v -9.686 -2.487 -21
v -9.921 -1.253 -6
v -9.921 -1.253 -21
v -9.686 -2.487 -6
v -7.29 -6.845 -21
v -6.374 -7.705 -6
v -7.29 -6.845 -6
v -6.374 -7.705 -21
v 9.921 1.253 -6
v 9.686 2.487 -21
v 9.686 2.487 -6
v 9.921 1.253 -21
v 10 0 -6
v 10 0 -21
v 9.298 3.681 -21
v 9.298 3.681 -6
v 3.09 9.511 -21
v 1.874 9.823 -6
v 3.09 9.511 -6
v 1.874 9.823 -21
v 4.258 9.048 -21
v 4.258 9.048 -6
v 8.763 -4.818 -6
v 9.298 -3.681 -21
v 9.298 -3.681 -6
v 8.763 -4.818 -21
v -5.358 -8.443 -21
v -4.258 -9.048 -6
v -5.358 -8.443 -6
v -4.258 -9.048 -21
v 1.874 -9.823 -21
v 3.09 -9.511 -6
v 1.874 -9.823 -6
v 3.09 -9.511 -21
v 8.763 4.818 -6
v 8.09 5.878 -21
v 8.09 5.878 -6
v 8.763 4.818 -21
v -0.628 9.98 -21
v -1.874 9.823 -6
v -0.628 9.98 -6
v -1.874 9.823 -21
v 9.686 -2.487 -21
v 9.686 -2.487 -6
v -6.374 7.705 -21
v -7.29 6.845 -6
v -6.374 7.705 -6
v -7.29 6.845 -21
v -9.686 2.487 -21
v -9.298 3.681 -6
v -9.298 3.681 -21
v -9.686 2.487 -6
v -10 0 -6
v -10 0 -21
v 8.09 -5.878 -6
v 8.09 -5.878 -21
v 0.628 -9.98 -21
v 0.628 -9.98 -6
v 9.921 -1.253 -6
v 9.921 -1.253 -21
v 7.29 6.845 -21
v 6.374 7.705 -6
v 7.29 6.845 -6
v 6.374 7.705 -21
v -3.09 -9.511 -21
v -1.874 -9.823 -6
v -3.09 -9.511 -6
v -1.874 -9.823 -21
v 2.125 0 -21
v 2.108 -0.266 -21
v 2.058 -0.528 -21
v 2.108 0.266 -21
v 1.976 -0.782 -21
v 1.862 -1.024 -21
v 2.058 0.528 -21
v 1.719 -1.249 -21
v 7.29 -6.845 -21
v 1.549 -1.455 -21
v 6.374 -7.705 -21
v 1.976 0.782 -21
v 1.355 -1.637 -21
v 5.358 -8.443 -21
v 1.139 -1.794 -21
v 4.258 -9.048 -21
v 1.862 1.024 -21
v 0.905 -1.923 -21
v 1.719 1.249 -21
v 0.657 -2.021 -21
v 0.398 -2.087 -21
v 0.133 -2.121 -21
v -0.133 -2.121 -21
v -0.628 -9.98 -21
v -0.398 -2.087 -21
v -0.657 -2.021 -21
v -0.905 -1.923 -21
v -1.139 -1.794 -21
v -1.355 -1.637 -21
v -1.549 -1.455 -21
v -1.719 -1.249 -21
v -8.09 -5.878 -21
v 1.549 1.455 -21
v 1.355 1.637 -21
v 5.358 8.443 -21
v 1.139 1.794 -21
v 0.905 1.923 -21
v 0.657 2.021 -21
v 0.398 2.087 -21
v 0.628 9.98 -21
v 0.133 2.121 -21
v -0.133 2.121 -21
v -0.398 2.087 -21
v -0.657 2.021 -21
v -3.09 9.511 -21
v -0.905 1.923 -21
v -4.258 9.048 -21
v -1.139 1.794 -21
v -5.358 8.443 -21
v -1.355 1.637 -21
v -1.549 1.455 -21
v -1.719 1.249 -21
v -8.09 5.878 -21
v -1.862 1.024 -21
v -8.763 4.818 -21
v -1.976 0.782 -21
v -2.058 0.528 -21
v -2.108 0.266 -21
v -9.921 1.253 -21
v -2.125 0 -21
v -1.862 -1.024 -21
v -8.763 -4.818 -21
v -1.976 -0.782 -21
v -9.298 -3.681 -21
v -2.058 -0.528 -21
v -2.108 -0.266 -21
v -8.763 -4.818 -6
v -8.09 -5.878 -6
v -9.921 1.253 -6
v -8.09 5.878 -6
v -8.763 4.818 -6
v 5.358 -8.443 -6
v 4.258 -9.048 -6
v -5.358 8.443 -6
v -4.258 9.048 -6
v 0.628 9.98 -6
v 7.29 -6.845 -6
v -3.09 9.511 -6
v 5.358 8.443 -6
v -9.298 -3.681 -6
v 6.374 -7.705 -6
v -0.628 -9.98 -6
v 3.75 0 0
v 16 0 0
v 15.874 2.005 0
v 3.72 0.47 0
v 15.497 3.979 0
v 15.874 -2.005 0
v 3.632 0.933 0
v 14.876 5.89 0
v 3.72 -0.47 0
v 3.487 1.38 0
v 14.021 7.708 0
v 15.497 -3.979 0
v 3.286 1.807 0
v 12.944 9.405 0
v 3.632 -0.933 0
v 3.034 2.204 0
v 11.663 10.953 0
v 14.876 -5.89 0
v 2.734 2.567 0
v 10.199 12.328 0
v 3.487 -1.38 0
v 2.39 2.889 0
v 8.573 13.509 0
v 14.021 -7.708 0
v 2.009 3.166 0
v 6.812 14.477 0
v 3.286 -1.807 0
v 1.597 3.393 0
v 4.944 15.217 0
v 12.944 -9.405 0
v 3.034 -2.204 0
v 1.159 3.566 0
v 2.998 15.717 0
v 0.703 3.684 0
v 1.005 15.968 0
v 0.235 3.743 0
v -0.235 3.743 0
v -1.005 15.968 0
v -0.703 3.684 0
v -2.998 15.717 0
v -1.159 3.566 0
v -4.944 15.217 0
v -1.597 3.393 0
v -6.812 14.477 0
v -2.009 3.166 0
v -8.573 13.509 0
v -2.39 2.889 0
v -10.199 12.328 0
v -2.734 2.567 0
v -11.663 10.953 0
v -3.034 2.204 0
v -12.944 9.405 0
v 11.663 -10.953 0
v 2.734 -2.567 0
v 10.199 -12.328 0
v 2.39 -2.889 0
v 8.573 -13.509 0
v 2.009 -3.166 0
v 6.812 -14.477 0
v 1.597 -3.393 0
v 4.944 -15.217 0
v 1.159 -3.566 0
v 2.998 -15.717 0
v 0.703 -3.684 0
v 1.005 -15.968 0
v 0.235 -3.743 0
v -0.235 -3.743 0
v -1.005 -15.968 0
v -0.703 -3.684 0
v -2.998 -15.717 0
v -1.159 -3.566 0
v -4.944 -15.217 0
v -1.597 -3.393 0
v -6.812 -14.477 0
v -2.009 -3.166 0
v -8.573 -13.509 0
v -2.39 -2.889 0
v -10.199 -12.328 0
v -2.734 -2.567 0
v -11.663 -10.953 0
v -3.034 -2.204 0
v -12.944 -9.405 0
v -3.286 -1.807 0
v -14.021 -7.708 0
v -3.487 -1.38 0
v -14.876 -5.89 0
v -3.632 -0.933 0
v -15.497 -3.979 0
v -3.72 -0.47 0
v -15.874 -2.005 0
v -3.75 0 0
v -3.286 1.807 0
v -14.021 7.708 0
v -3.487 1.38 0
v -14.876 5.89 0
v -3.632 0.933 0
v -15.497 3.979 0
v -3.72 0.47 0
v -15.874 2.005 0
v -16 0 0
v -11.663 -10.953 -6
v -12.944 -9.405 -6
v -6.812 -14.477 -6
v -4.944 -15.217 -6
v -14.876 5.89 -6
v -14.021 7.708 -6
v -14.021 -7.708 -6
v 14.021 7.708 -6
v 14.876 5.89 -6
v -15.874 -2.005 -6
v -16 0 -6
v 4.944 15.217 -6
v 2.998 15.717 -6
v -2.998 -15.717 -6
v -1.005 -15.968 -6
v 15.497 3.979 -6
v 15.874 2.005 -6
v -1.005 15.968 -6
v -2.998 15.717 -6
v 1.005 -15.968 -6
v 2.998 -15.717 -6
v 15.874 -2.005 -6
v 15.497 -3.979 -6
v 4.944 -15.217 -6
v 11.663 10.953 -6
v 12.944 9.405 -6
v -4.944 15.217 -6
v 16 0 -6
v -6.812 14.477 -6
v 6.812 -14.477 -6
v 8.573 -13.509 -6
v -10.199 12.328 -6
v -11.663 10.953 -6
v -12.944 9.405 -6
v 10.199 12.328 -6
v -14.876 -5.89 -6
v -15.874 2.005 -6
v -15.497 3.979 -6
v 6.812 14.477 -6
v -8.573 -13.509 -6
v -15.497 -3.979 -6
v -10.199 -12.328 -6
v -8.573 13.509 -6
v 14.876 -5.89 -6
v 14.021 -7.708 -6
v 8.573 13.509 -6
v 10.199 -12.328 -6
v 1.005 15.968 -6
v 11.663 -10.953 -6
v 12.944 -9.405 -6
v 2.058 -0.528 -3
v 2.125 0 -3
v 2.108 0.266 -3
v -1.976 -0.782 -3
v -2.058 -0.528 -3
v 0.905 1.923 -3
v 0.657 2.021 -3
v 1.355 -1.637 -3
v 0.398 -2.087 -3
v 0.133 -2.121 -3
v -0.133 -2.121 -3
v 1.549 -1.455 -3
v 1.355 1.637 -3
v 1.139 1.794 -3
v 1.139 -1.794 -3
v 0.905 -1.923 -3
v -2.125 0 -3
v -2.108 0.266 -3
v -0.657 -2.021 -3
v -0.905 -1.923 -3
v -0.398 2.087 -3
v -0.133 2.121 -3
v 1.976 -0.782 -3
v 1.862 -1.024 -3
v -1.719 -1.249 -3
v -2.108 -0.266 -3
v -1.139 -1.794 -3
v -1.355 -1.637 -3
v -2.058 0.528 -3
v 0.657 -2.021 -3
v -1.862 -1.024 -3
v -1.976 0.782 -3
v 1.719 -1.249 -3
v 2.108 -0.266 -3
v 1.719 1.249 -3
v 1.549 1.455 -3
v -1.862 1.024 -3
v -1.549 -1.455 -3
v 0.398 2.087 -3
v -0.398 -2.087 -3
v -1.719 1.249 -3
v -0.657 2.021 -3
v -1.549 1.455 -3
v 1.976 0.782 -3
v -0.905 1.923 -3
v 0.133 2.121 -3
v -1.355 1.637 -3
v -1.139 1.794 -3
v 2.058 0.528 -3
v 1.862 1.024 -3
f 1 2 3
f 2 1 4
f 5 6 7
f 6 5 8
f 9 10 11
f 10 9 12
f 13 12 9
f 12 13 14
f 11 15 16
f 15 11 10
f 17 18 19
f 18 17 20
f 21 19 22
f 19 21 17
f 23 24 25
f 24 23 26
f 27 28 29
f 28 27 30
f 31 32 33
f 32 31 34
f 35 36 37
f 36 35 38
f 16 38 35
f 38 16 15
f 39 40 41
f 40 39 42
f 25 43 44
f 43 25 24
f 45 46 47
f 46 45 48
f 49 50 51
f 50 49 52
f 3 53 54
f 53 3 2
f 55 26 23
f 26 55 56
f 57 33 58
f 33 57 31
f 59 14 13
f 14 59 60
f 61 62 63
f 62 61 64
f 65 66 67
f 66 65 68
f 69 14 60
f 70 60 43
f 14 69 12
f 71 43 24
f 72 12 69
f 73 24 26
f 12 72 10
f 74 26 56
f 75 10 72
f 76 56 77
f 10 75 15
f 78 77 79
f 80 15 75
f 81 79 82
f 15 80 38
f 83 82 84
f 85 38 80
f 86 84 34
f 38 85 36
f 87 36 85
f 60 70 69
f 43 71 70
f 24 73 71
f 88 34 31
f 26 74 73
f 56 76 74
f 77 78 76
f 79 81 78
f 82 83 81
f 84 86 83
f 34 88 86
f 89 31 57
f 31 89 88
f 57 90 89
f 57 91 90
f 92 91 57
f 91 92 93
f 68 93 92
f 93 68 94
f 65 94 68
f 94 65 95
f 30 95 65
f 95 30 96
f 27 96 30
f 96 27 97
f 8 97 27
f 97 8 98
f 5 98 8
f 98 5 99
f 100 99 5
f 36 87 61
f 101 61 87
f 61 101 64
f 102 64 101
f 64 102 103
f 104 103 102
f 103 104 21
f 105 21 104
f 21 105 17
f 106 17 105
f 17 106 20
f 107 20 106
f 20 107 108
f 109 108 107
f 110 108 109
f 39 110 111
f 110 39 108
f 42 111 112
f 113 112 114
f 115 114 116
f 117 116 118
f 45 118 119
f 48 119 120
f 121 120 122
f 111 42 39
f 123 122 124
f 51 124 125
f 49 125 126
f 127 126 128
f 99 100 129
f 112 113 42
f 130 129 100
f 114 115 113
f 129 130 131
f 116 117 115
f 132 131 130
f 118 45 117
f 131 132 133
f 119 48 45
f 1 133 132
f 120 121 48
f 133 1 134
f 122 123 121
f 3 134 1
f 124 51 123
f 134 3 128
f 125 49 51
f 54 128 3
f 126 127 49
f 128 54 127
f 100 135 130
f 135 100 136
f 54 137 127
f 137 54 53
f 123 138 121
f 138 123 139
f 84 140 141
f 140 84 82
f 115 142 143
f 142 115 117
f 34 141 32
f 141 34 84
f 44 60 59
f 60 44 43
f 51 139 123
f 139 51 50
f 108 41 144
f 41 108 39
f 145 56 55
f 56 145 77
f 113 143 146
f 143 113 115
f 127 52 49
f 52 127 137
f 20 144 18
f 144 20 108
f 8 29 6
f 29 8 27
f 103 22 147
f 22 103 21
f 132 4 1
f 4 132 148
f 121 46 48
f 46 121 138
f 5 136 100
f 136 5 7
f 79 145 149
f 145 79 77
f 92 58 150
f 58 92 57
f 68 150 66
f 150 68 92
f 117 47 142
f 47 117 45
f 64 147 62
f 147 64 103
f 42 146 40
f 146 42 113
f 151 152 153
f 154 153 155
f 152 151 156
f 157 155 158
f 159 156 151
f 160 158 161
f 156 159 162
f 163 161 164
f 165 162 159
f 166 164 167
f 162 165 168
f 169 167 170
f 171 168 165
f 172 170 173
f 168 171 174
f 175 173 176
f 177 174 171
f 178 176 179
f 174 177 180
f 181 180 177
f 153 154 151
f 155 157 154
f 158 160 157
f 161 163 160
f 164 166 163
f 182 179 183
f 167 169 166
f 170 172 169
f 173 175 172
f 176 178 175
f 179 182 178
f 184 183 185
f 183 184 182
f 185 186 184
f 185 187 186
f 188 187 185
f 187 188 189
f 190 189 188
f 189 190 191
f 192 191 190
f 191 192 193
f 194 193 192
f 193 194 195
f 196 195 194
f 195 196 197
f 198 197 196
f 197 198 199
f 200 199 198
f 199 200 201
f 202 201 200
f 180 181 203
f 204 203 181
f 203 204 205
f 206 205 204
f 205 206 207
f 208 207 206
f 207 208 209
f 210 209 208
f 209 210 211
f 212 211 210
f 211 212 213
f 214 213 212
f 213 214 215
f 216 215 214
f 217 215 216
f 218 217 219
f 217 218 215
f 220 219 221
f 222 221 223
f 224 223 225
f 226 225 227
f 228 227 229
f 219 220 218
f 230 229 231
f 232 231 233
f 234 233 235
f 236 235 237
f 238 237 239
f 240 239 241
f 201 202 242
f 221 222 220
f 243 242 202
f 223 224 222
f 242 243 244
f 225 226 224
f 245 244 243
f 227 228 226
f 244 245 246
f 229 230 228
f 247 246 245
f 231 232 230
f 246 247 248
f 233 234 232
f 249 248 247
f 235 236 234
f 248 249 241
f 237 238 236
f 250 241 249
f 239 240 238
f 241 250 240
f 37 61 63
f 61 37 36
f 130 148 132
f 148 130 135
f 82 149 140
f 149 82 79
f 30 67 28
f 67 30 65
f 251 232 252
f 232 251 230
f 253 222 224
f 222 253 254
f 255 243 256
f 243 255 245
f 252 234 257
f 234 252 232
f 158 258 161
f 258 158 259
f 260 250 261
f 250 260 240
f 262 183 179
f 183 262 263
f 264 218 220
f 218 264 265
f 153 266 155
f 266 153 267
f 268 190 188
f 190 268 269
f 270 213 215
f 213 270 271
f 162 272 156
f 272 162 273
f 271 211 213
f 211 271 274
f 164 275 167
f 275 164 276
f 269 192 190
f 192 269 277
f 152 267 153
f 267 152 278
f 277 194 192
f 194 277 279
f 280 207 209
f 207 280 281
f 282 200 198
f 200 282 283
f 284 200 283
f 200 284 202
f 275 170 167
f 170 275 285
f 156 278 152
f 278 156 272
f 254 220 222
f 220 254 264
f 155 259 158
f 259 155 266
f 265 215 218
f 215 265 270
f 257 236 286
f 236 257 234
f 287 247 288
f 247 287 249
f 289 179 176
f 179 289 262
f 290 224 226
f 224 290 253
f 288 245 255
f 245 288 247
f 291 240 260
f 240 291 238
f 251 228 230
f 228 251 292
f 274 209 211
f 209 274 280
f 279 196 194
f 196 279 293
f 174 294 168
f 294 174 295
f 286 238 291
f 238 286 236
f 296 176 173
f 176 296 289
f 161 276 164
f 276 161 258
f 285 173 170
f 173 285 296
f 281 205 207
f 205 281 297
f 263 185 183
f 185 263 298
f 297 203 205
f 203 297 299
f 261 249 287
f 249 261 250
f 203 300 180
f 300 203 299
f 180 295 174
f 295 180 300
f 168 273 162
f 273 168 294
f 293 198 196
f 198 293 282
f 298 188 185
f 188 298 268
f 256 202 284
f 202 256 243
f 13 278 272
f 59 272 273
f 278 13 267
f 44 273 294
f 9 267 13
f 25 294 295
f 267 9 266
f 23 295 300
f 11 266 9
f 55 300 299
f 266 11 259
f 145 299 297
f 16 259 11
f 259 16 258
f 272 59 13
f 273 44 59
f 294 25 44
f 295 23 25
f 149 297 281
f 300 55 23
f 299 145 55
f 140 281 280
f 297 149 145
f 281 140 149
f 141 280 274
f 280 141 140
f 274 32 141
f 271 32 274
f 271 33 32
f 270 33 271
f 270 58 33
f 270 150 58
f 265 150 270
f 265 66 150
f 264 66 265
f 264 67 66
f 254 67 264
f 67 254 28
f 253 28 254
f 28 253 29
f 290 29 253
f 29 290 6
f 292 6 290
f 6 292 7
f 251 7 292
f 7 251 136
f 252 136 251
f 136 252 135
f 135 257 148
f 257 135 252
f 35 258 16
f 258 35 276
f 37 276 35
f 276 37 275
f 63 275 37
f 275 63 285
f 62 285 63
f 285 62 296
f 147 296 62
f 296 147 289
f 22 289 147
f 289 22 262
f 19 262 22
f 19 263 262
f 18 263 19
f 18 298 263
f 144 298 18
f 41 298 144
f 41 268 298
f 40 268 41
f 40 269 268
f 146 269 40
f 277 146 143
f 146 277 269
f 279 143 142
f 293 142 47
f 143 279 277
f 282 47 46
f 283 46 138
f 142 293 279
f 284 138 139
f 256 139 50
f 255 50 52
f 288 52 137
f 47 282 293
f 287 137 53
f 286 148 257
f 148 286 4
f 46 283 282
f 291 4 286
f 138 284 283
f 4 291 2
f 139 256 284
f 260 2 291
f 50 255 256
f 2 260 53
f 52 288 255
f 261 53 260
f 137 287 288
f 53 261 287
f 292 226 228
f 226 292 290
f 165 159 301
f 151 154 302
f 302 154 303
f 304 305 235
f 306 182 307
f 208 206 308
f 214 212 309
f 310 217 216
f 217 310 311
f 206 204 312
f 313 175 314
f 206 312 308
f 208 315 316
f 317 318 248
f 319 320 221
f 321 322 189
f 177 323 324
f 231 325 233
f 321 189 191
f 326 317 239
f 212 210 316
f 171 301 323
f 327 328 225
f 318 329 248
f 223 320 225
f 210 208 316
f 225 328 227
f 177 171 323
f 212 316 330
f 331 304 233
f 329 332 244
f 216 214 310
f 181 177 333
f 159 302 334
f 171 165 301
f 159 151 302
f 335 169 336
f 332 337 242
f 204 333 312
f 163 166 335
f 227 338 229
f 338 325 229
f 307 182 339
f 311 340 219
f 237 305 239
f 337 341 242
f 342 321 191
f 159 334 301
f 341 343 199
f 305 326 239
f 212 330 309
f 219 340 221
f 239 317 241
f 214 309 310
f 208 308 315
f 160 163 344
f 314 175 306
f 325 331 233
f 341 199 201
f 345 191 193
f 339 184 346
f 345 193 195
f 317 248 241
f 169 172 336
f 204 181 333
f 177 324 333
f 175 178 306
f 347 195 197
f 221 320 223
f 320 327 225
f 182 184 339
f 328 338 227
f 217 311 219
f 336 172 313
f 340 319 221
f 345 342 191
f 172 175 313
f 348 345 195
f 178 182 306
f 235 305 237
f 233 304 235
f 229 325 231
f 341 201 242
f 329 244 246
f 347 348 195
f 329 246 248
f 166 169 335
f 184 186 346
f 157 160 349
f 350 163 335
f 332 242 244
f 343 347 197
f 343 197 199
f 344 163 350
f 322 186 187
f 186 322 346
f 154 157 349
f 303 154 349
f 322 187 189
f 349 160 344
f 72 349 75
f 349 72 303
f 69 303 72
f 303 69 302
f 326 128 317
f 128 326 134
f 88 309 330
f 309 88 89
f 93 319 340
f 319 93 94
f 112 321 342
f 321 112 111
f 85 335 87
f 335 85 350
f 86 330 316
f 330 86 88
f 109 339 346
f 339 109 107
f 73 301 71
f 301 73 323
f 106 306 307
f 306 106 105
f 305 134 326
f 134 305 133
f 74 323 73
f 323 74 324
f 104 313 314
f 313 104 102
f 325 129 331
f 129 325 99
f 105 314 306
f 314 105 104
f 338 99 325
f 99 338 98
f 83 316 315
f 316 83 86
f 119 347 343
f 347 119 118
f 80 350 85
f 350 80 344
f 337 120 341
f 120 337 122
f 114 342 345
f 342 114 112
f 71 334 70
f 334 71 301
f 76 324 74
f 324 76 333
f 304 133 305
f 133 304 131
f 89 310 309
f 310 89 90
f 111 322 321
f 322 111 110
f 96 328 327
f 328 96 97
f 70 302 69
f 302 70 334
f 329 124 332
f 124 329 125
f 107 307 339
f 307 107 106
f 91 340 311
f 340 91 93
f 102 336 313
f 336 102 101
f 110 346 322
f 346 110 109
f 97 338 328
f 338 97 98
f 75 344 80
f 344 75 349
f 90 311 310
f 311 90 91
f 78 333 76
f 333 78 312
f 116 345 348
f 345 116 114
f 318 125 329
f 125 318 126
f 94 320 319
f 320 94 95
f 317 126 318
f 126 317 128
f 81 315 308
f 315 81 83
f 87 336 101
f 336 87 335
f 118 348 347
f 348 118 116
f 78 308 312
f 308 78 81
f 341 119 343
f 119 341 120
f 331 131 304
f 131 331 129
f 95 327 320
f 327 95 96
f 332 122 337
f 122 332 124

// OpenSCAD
$fn = 50;


difference() {
	union() {
		translate(v = [0, 0, -21.0000000000]) {
			cylinder(h = 21, r = 10.0000000000);
		}
		translate(v = [0, 0, -6.0000000000]) {
			cylinder(h = 6, r = 16.0000000000);
		}
	}
	union() {
		translate(v = [0, 0, 0]) {
			rotate(a = [0, 0, 0]) {
				difference() {
					union() {
						#translate(v = [0, 0, -21.0000000000]) {
							cylinder(h = 21, r = 2.0000000000);
						}
						#translate(v = [0, 0, -3]) {
							cylinder(h = 3, r1 = 2.1250000000, r2 = 3.7500000000);
						}
						#translate(v = [0, 0, -21.0000000000]) {
							cylinder(h = 21, r = 2.1250000000);
						}
						#translate(v = [0, 0, -21.0000000000]) {
							cylinder(h = 21, r = 2.0000000000);
						}
					}
					union();
				}
			}
		}
	}
}
